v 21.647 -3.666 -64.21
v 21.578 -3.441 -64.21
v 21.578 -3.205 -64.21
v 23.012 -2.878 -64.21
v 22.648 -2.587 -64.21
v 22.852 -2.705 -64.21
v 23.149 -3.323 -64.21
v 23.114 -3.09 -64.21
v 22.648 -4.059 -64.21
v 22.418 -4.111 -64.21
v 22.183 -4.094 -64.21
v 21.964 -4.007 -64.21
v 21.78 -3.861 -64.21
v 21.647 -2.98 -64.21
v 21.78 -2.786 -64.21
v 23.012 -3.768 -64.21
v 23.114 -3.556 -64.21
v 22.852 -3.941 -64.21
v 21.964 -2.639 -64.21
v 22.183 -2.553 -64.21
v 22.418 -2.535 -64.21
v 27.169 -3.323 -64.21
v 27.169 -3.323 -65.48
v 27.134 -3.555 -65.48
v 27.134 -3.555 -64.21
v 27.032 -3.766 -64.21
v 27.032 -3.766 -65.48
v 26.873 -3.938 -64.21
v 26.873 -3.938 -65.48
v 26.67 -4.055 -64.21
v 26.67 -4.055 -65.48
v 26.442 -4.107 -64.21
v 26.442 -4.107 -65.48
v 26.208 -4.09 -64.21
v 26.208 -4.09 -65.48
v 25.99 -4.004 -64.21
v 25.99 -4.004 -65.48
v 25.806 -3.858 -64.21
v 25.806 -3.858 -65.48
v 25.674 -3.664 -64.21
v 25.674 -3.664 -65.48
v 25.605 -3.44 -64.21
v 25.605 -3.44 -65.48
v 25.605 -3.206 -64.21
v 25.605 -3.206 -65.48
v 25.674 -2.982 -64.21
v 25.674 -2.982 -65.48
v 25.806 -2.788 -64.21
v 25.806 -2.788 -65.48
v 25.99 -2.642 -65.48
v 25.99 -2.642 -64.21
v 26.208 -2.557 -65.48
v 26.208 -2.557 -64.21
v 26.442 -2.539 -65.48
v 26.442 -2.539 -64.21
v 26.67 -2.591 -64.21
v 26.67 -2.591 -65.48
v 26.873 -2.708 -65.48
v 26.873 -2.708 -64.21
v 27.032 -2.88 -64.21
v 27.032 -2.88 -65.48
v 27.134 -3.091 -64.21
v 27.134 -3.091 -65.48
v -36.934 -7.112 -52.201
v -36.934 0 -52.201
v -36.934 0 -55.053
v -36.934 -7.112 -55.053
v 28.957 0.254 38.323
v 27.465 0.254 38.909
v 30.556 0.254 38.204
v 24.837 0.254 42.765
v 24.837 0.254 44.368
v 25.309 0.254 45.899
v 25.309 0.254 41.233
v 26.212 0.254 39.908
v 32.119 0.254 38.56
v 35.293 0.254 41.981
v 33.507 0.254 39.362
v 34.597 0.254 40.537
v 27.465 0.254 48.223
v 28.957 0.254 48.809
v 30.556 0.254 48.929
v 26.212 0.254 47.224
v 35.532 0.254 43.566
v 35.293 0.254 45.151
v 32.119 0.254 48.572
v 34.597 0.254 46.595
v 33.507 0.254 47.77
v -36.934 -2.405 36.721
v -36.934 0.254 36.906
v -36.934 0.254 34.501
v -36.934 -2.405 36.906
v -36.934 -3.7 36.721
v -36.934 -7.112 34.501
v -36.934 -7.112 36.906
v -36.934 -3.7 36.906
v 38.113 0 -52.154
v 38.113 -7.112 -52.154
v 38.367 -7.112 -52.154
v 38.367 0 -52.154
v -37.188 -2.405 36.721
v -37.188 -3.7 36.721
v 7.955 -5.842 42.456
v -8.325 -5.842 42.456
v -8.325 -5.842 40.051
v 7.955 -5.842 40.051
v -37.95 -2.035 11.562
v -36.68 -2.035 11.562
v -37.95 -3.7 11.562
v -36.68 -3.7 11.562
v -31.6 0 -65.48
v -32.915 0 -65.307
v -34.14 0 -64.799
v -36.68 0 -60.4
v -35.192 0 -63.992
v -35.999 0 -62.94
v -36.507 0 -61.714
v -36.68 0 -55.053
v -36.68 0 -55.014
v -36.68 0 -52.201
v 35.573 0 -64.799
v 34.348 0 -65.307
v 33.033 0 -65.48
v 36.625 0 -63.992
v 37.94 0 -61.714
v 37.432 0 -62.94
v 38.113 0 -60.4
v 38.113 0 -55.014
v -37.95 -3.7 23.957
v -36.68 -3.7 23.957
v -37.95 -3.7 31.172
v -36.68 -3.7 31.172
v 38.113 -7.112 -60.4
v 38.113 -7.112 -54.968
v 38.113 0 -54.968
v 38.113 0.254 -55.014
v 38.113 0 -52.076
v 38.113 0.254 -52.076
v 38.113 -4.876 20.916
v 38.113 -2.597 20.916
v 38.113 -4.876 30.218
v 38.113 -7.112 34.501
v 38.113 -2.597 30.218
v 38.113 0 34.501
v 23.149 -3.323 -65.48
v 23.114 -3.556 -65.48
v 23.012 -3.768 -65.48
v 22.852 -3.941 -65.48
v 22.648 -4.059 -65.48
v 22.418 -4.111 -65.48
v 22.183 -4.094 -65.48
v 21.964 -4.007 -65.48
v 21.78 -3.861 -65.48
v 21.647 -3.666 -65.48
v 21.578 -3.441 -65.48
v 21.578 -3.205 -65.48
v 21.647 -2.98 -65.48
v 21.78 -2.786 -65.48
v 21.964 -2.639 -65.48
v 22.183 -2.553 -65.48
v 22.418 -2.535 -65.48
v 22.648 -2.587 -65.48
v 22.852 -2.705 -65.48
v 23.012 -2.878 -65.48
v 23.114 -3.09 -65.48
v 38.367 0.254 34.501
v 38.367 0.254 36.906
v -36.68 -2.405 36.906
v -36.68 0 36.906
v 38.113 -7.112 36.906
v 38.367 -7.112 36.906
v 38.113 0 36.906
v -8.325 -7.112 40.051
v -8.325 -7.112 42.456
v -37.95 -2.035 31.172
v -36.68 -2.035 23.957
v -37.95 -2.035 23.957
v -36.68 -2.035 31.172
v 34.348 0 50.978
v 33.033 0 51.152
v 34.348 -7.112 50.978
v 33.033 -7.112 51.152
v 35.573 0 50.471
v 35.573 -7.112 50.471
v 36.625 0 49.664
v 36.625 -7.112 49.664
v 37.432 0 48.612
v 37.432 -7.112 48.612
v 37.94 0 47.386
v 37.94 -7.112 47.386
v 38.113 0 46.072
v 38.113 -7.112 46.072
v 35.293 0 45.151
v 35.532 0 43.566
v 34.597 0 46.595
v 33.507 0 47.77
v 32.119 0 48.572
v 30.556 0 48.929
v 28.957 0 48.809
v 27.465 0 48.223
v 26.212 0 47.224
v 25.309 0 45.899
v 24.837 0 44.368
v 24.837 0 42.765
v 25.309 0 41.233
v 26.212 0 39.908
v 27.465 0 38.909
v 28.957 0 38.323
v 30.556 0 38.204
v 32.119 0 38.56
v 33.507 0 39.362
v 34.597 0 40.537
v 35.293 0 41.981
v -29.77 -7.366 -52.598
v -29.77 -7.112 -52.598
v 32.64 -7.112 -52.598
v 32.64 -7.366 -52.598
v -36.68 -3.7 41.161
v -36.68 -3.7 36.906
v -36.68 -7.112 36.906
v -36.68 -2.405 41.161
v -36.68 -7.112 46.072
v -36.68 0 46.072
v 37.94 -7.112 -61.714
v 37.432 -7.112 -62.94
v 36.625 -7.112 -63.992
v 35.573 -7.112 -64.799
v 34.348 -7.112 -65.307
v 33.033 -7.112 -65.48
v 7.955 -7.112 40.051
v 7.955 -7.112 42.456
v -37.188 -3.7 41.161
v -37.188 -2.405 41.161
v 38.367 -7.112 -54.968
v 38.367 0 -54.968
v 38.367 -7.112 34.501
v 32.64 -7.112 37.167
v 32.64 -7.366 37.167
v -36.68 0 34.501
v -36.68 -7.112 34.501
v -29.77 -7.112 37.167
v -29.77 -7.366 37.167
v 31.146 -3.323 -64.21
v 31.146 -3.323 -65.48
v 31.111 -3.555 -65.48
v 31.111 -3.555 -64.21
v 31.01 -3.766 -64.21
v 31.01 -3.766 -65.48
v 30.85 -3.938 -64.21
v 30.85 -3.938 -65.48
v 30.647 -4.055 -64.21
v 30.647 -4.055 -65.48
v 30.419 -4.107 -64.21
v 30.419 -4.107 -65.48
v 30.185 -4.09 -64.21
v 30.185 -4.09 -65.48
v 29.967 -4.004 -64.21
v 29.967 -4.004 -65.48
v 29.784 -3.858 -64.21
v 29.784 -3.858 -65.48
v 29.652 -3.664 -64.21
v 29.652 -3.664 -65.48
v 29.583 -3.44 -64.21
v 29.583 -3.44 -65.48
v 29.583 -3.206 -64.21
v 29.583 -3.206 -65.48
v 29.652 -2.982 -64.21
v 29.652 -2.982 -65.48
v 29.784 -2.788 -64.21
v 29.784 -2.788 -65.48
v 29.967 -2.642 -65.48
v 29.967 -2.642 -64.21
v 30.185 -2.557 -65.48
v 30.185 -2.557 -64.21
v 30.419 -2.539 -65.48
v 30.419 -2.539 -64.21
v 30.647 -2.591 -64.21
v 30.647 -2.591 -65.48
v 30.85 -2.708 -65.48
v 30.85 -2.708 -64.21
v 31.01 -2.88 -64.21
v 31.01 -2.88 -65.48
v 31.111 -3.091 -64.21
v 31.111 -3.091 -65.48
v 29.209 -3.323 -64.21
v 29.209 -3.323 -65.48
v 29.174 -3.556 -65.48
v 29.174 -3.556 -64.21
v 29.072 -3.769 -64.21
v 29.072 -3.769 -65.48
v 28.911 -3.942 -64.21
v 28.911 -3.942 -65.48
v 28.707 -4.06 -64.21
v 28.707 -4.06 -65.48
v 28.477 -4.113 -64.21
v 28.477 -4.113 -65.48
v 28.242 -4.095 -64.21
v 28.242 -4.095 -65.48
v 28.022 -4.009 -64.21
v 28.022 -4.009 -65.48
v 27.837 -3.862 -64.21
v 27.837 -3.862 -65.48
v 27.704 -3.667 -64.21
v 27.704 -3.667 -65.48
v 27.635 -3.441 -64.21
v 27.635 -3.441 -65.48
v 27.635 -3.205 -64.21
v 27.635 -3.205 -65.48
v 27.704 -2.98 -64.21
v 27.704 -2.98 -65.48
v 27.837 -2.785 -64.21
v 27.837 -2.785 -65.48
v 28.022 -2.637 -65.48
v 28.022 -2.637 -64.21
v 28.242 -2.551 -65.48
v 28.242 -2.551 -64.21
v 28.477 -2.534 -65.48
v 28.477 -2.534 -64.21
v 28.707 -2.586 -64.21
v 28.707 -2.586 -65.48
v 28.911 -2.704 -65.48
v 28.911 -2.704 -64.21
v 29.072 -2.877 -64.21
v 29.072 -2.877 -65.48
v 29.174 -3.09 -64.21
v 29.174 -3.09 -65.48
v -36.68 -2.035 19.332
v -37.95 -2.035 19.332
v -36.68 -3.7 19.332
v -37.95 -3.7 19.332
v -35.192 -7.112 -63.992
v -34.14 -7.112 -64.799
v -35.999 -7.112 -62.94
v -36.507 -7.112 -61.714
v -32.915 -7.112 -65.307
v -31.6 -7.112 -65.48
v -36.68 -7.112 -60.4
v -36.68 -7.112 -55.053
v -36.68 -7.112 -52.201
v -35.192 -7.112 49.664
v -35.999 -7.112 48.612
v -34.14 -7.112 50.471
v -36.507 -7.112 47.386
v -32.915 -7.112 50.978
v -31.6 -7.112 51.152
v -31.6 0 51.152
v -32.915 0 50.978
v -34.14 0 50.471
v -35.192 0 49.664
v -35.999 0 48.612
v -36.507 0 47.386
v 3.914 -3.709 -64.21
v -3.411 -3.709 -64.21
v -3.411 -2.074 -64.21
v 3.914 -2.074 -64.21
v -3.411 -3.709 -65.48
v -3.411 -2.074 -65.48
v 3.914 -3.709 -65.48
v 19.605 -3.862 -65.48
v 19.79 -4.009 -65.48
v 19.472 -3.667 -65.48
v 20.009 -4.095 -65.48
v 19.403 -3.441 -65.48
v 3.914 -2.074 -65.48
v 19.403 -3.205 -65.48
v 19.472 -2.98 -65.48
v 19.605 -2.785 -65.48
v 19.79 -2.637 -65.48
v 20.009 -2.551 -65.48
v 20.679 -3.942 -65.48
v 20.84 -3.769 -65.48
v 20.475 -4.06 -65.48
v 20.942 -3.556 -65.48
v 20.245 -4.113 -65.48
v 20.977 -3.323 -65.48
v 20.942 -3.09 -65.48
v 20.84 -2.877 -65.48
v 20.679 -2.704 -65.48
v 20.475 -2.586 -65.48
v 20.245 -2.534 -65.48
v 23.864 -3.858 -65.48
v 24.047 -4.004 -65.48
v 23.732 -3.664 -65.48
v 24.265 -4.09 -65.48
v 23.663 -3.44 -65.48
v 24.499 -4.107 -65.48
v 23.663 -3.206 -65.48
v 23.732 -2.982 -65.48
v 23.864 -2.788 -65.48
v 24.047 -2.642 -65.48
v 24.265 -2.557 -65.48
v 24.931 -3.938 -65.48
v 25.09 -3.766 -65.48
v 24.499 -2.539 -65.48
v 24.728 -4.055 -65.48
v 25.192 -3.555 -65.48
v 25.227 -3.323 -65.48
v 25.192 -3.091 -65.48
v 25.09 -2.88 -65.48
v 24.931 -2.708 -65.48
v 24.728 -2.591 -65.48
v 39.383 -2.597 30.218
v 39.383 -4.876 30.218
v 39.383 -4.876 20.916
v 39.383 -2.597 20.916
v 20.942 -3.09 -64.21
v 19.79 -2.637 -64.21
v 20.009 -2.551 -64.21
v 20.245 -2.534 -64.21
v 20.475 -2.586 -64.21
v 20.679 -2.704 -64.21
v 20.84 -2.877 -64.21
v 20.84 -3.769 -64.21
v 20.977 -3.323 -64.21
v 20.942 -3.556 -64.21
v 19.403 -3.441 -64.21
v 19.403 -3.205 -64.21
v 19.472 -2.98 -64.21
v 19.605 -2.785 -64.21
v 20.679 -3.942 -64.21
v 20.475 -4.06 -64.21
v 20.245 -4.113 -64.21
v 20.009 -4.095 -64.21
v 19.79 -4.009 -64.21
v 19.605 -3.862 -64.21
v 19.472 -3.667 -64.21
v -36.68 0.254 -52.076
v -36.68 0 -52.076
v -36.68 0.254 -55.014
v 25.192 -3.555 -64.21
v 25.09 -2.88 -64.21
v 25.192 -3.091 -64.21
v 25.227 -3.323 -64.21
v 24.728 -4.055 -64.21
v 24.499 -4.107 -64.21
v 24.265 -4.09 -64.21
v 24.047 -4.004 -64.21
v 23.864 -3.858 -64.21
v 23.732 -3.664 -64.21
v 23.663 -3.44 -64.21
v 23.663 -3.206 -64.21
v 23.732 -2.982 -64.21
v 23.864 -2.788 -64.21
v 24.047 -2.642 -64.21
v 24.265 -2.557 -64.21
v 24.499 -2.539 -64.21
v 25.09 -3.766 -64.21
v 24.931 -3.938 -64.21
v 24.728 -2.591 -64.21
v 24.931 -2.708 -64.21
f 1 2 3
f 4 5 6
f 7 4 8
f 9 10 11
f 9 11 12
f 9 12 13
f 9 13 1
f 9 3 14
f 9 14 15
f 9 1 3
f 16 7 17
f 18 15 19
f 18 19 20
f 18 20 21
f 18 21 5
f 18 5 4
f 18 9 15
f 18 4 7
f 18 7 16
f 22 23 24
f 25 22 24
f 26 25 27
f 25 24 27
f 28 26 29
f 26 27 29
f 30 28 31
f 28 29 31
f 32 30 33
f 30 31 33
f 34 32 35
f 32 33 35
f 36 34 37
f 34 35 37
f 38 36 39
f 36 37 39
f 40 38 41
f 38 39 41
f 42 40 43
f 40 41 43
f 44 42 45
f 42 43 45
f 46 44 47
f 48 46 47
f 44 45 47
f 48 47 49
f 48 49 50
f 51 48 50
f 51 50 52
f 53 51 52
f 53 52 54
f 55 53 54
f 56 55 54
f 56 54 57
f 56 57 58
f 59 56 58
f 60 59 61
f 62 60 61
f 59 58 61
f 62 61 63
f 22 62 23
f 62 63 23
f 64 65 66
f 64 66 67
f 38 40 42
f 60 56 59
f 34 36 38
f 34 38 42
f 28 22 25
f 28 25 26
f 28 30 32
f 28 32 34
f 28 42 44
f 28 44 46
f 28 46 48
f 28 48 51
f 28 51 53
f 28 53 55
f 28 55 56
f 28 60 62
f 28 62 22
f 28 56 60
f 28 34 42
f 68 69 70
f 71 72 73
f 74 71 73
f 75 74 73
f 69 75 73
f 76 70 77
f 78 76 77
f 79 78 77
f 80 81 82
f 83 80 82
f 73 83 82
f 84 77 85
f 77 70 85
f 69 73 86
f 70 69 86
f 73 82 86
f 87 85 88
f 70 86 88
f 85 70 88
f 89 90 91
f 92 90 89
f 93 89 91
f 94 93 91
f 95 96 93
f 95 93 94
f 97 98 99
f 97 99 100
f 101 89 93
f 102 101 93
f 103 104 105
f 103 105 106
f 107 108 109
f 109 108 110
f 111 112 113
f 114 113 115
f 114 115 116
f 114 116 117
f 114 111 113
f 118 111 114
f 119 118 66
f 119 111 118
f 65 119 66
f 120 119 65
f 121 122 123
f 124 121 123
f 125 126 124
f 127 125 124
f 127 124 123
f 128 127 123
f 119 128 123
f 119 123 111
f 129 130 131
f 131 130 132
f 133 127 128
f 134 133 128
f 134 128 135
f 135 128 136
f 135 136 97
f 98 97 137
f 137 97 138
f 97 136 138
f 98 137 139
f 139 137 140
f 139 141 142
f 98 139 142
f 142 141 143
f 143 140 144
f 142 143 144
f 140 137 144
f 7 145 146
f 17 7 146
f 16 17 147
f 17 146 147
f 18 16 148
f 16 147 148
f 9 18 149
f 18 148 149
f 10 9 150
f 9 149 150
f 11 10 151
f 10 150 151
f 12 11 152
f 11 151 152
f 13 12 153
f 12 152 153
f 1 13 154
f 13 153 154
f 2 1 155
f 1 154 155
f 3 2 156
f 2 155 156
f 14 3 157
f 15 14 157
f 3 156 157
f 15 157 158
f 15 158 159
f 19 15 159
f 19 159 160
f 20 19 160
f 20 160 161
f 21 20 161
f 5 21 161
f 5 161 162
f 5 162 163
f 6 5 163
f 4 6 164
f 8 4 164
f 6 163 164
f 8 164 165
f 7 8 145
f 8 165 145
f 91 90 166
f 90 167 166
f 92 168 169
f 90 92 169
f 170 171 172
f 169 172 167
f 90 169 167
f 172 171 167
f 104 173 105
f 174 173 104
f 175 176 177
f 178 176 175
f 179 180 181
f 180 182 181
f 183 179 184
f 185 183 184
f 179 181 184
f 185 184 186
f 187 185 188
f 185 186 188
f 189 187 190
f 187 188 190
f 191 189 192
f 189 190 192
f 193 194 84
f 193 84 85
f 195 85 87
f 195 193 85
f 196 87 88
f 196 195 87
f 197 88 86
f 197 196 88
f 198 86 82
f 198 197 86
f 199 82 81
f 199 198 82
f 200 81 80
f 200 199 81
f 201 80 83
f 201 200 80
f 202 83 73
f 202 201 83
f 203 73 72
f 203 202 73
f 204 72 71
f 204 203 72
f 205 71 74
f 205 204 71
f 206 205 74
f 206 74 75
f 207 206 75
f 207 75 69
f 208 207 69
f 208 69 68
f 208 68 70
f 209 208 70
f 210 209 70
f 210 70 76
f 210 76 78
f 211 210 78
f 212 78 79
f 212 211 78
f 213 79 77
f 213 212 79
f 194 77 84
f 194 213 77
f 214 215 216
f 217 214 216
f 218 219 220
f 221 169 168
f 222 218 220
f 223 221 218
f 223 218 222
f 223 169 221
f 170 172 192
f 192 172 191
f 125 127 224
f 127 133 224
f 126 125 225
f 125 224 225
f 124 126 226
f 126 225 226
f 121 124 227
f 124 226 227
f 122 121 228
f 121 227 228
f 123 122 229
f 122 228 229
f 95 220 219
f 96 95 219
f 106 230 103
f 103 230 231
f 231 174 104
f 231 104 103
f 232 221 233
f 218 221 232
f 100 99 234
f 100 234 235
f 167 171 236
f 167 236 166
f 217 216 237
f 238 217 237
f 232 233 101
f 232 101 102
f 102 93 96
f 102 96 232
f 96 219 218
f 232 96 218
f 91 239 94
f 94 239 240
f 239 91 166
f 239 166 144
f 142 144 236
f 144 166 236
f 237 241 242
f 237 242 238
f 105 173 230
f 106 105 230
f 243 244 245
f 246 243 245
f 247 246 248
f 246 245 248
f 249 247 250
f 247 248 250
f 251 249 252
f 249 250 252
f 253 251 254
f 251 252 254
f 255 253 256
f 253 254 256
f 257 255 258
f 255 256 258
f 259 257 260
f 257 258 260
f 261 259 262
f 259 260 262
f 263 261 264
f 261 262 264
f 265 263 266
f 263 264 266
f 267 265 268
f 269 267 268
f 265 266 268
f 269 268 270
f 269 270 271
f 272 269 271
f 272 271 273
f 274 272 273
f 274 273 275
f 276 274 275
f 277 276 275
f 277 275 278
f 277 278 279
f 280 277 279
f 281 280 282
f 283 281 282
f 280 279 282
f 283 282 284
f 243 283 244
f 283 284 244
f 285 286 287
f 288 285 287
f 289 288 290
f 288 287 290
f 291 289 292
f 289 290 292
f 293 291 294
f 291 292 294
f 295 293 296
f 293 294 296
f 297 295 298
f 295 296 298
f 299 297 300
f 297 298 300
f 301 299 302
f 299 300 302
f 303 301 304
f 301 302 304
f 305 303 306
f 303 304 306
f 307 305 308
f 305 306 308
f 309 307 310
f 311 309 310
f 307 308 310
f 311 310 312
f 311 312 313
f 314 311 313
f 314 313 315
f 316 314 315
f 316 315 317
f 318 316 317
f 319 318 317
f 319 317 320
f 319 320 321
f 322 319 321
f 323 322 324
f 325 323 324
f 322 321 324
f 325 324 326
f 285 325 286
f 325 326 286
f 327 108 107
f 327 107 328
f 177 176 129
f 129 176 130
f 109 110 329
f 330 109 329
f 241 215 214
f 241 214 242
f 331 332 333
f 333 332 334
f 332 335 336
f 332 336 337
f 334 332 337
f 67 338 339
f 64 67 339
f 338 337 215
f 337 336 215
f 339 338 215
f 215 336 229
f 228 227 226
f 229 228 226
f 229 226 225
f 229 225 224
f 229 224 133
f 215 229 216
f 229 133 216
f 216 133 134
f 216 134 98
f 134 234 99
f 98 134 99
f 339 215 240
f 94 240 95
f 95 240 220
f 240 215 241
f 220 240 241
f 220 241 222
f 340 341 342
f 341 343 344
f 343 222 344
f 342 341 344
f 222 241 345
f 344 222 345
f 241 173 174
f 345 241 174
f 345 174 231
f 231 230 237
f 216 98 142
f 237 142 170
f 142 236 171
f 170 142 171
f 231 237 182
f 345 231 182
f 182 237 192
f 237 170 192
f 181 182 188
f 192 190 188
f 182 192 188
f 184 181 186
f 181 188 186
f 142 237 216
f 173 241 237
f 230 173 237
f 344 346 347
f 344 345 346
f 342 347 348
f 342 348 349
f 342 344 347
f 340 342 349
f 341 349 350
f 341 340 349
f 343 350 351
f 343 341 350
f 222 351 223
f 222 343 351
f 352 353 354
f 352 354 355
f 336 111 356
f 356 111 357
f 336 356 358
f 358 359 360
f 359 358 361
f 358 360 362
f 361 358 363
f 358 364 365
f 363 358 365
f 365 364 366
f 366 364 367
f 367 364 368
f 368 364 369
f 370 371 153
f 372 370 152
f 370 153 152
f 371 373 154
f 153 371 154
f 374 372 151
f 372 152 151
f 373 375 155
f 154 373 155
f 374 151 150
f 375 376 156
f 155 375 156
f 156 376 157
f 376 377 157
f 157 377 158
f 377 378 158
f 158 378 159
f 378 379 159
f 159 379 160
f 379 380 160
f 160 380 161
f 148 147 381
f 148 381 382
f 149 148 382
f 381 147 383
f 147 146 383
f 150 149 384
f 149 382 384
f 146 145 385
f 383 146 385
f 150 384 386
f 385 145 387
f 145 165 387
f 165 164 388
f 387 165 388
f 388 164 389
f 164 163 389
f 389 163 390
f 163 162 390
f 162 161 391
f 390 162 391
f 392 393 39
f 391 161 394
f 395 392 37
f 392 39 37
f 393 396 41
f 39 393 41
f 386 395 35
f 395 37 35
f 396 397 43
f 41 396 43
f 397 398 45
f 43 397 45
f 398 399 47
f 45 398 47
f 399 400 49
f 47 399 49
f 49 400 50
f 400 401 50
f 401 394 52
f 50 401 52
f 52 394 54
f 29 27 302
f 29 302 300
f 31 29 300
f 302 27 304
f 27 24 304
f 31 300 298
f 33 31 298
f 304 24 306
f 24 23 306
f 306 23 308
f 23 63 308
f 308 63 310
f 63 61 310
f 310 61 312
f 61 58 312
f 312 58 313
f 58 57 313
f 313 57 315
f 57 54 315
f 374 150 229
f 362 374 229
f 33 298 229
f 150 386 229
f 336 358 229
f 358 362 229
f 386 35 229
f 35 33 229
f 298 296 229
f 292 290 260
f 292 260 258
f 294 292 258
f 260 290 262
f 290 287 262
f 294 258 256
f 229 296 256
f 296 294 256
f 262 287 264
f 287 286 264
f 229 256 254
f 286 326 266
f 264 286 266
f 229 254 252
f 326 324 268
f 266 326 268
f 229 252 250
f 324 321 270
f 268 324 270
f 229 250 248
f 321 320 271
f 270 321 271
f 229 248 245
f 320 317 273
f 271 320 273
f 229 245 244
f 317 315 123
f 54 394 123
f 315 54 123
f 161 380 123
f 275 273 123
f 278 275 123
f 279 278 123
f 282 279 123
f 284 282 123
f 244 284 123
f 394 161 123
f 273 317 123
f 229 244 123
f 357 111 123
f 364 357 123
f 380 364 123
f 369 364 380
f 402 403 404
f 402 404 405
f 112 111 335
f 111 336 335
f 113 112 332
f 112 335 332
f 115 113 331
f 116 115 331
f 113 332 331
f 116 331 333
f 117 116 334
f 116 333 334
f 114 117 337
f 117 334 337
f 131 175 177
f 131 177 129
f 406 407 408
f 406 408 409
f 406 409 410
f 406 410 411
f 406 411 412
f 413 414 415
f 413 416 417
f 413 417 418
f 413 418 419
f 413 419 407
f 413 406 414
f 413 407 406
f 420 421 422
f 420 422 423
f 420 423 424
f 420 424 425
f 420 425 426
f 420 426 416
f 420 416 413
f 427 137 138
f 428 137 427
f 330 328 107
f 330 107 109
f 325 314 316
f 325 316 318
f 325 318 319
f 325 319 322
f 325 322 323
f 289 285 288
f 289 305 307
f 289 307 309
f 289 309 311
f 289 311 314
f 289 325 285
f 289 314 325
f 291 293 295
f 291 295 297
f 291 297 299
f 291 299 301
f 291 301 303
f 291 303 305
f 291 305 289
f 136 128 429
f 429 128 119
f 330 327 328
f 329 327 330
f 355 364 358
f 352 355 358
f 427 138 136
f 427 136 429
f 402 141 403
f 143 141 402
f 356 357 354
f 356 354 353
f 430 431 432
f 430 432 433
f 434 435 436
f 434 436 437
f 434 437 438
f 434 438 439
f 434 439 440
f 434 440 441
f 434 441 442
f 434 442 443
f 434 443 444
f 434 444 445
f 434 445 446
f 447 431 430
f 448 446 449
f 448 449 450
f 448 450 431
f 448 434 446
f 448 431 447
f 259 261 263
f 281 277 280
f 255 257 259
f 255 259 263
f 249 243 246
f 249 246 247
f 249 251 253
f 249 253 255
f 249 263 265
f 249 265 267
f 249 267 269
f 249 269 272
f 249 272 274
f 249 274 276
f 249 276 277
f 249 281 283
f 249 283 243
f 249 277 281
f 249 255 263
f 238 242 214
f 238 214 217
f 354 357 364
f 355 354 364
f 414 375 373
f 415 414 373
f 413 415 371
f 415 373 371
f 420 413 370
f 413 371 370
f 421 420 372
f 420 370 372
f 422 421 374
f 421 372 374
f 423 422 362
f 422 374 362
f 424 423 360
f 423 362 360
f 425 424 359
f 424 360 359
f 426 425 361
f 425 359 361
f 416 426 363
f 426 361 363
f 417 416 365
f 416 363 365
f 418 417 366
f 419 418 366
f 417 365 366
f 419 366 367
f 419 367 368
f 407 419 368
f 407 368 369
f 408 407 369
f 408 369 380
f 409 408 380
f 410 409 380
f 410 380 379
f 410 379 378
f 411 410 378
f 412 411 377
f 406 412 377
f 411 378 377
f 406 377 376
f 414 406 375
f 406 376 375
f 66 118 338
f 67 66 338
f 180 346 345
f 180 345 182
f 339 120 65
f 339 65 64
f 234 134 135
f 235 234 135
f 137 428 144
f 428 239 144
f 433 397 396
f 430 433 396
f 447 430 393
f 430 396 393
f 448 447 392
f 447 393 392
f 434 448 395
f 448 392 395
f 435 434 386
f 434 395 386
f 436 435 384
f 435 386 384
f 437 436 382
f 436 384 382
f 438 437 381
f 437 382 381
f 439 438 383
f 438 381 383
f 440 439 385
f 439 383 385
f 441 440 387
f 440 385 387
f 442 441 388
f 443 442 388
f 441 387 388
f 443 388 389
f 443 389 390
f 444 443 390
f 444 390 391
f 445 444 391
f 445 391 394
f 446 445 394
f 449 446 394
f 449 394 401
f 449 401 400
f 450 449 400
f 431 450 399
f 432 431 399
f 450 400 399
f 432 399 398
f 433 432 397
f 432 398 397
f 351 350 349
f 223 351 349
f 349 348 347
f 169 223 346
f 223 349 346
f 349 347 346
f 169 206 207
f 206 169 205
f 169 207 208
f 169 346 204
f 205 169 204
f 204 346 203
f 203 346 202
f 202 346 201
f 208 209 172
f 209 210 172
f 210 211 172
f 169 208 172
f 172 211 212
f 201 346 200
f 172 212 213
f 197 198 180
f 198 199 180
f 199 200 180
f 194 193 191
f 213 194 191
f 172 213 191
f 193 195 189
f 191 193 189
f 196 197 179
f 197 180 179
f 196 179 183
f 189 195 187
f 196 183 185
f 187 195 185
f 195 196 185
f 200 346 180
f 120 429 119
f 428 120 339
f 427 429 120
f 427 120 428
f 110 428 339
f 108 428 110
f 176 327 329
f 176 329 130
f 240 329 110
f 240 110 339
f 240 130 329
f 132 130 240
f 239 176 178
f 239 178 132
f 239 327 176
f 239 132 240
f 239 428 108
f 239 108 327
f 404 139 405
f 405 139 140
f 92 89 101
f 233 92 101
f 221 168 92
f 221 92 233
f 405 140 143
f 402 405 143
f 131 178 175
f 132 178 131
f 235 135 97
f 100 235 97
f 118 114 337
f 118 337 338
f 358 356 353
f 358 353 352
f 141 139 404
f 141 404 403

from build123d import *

# Parameters (mm, degrees)
F0_W      = 74.7929699719
F0_H      = 116.6311837733
F1_DEPTH  = 7.112
F2_W      = 2.2798741702
F2_H      = 9.3019269407
F3_DEPTH  = 1.27
F4_W      = 1.6649477184
F4_H      = 7.7697578818
F5_DEPTH  = 1.27
F4_H_2    = 7.214775309
F6_DEPTH  = 1.27
F4_W_2    = 1.2949595693
F4_H_3    = 4.4398605824
F7_DEPTH  = 0.508
F10_W     = 16.2794925272
F10_H     = 2.4049207568
F11_DEPTH = 1.27
F14_R     = 5.08
F15_R     = 5.08
F16_W     = 62.410261482
F16_H     = 89.7654034197
F17_DEPTH = 0.254
F21_R     = 5.3775746227
F22_DEPTH = 0.254
F25_W     = 74.7929699719
F25_H     = 2.4049244821
F26_DEPTH = 0.254
F29_DEPTH = 0.254
F30_DEPTH = 0.254
F31_W     = 74.7929699719
F31_H     = 2.9377117753
F34_DEPTH = 0.254
F32_W     = 7.112
F32_H     = 2.813577652
F35_DEPTH = 0.254
F33_W     = 7.112
F33_H     = 2.8514191508
F36_DEPTH = 0.254
F8_R      = 0.7916480681
F39_DEPTH = 1.27
F9_R      = 0.7862255443
F9_R_2    = 0.7916480681
F9_R_3    = 0.7862255169
F9_R_4    = 0.7902964021
F40_DEPTH = 1.27
F41_W     = 7.3253975715
F41_H     = 1.6351337545
F42_DEPTH = 1.27


# Not quite as in the source:
# - the program builds the solid bodies; features that only make, move or delete a surface that nothing else refers to are left out


with BuildPart() as f1:
    # F0 (on Front) → F1 (new body)
    with BuildSketch(Plane.XZ):
        with Locations((0.7164049894, -7.1640815586)):
            Rectangle(F0_W, F0_H)
    extrude(amount=F1_DEPTH)

    # F2 (on face) → F3 (join)
    with BuildSketch(Plane.YZ.offset(38.1128899753)):
        with Locations((-3.7364399759, 25.567272678)):
            Rectangle(F2_W, F2_H)
    extrude(amount=F3_DEPTH)

    # F4 (on face) → F5 (join)
    with BuildSketch(Plane(origin=(-36.6800799966, 0, 0), x_dir=(0, -1, 0), z_dir=(-1, 0, 0))):
        with Locations((2.8674099594, 15.4470177367)):
            Rectangle(F4_W, F4_H)
    extrude(amount=F5_DEPTH)

    # F4 (on face) → F6 (join)
    with BuildSketch(Plane(origin=(-36.6800799966, 0, 0), x_dir=(0, -1, 0), z_dir=(-1, 0, 0))):
        with Locations((2.8674099594, 27.5641391054)):
            Rectangle(F4_W, F4_H_2)
    extrude(amount=F6_DEPTH)

    # F4 (on face) → F7 (join)
    with BuildSketch(Plane(origin=(-36.6800799966, 0, 0), x_dir=(0, -1, 0), z_dir=(-1, 0, 0))):
        with Locations((3.052404034, 38.941282779)):
            Rectangle(F4_W_2, F4_H_3)
    extrude(amount=F7_DEPTH)

    # F10 (on face) → F11 (cut)
    with BuildSketch(Plane.XZ.offset(7.112)):
        with Locations((-0.1849941909, 41.2537120283)):
            Rectangle(F10_W, F10_H)
    extrude(amount=-F11_DEPTH, mode=Mode.SUBTRACT)

    # F14
    f14_edges = [f1.edges().sort_by_distance(p)[0] for p in [
        (38.11289, -3.556, 51.15151),
    ]]
    fillet(f14_edges, radius=F14_R)

    # F15
    f15_edges = [f1.edges().sort_by_distance(p)[0] for p in [
        (-36.68008, -3.556, 51.15151),
        (-36.68008, -3.556, -65.479673),
        (38.11289, -3.556, -65.479673),
    ]]
    fillet(f15_edges, radius=F15_R)

    # F16 (on face) → F17 (join)
    with BuildSketch(Plane.XZ.offset(7.112)):
        with Locations((1.43471919, -7.7157635242)):
            Rectangle(F16_W, F16_H)
    extrude(amount=F17_DEPTH)

    # F21 (on Front) → F22 (join)
    with BuildSketch(Plane.XZ):
        with Locations((30.1540587097, 43.5661412776)):
            Circle(F21_R)
    extrude(amount=-F22_DEPTH)

    # F25 (on face) → F26 (join)
    with BuildSketch(Plane(origin=(0, 0, 0), x_dir=(-1, 0, 0), z_dir=(0, 1, 0))):
        with Locations((-0.7164049894, 35.7038844377)):
            Rectangle(F25_W, F25_H)
    extrude(amount=F26_DEPTH)

    # F27 (on face) → F29 (join)
    with BuildSketch(Plane.YZ.offset(38.1128899753)):
        Polygon((0.254, 34.5014221966), (0.254, 36.9063466787), (0, 36.9063466787), (-7.112, 36.9063466787), (-7.112, 34.5014221966), (0, 34.5014221966), align=None)
    extrude(amount=F29_DEPTH)

    # F28 (on face) → F30 (join)
    with BuildSketch(Plane(origin=(-36.6800799966, 0, 0), x_dir=(0, -1, 0), z_dir=(-1, 0, 0))):
        Polygon((2.4049242493, 36.9063466787), (0, 36.9063466787), (-0.254, 36.9063466787), (-0.254, 34.5014221966), (0, 34.5014221966), (7.112, 34.5014221966), (7.112, 36.9063466787), (3.6998838186, 36.9063466787), (3.6998838186, 36.7213524878), (2.4049242493, 36.7213524878), align=None)
    extrude(amount=F30_DEPTH)

    # F31 (on face) → F34 (join)
    with BuildSketch(Plane(origin=(0, 0, 0), x_dir=(-1, 0, 0), z_dir=(0, 1, 0))):
        with Locations((-0.7164049894, -53.544729948)):
            Rectangle(F31_W, F31_H)
    extrude(amount=F34_DEPTH)

    # F32 (on face) → F35 (join)
    with BuildSketch(Plane.YZ.offset(38.1128899753)):
        with Locations((-3.556, -53.5610467196)):
            Rectangle(F32_W, F32_H)
    extrude(amount=F35_DEPTH)

    # F33 (on face) → F36 (join)
    with BuildSketch(Plane(origin=(-36.6800799966, 0, 0), x_dir=(0, -1, 0), z_dir=(-1, 0, 0))):
        with Locations((3.556, -53.6269359291)):
            Rectangle(F33_W, F33_H)
    extrude(amount=F36_DEPTH)

    # F8 (on face) → F39 (cut)
    with BuildSketch(Plane(origin=(0, 0, -65.4796734452), x_dir=(1, 0, 0), z_dir=(0, 0, -1))):
        with Locations((20.1854705811, 3.3230686095)):
            Circle(F8_R)
    extrude(amount=-F39_DEPTH, mode=Mode.SUBTRACT)

    # F9 (on face) → F40 (cut)
    with BuildSketch(Plane(origin=(0, 0, -65.4796734452), x_dir=(1, 0, 0), z_dir=(0, 0, -1))):
        with Locations((30.3601529449, 3.3230686095)):
            Circle(F9_R)
        with Locations((28.4177139401, 3.3230686095)):
            Circle(F9_R_2)
        with Locations((26.3827759773, 3.3230686095)):
            Circle(F9_R)
        with Locations((24.4403369725, 3.3230686095)):
            Circle(F9_R_3)
        with Locations((22.3591532558, 3.3230686095)):
            Circle(F9_R_4)
    extrude(amount=-F40_DEPTH, mode=Mode.SUBTRACT)

    # F41 (on face) → F42 (cut)
    with BuildSketch(Plane(origin=(0, 0, -65.4796734452), x_dir=(1, 0, 0), z_dir=(0, 0, -1))):
        with Locations((0.251334277, 2.8914771974)):
            Rectangle(F41_W, F41_H)
    extrude(amount=-F42_DEPTH, mode=Mode.SUBTRACT)


solid = f1.part
